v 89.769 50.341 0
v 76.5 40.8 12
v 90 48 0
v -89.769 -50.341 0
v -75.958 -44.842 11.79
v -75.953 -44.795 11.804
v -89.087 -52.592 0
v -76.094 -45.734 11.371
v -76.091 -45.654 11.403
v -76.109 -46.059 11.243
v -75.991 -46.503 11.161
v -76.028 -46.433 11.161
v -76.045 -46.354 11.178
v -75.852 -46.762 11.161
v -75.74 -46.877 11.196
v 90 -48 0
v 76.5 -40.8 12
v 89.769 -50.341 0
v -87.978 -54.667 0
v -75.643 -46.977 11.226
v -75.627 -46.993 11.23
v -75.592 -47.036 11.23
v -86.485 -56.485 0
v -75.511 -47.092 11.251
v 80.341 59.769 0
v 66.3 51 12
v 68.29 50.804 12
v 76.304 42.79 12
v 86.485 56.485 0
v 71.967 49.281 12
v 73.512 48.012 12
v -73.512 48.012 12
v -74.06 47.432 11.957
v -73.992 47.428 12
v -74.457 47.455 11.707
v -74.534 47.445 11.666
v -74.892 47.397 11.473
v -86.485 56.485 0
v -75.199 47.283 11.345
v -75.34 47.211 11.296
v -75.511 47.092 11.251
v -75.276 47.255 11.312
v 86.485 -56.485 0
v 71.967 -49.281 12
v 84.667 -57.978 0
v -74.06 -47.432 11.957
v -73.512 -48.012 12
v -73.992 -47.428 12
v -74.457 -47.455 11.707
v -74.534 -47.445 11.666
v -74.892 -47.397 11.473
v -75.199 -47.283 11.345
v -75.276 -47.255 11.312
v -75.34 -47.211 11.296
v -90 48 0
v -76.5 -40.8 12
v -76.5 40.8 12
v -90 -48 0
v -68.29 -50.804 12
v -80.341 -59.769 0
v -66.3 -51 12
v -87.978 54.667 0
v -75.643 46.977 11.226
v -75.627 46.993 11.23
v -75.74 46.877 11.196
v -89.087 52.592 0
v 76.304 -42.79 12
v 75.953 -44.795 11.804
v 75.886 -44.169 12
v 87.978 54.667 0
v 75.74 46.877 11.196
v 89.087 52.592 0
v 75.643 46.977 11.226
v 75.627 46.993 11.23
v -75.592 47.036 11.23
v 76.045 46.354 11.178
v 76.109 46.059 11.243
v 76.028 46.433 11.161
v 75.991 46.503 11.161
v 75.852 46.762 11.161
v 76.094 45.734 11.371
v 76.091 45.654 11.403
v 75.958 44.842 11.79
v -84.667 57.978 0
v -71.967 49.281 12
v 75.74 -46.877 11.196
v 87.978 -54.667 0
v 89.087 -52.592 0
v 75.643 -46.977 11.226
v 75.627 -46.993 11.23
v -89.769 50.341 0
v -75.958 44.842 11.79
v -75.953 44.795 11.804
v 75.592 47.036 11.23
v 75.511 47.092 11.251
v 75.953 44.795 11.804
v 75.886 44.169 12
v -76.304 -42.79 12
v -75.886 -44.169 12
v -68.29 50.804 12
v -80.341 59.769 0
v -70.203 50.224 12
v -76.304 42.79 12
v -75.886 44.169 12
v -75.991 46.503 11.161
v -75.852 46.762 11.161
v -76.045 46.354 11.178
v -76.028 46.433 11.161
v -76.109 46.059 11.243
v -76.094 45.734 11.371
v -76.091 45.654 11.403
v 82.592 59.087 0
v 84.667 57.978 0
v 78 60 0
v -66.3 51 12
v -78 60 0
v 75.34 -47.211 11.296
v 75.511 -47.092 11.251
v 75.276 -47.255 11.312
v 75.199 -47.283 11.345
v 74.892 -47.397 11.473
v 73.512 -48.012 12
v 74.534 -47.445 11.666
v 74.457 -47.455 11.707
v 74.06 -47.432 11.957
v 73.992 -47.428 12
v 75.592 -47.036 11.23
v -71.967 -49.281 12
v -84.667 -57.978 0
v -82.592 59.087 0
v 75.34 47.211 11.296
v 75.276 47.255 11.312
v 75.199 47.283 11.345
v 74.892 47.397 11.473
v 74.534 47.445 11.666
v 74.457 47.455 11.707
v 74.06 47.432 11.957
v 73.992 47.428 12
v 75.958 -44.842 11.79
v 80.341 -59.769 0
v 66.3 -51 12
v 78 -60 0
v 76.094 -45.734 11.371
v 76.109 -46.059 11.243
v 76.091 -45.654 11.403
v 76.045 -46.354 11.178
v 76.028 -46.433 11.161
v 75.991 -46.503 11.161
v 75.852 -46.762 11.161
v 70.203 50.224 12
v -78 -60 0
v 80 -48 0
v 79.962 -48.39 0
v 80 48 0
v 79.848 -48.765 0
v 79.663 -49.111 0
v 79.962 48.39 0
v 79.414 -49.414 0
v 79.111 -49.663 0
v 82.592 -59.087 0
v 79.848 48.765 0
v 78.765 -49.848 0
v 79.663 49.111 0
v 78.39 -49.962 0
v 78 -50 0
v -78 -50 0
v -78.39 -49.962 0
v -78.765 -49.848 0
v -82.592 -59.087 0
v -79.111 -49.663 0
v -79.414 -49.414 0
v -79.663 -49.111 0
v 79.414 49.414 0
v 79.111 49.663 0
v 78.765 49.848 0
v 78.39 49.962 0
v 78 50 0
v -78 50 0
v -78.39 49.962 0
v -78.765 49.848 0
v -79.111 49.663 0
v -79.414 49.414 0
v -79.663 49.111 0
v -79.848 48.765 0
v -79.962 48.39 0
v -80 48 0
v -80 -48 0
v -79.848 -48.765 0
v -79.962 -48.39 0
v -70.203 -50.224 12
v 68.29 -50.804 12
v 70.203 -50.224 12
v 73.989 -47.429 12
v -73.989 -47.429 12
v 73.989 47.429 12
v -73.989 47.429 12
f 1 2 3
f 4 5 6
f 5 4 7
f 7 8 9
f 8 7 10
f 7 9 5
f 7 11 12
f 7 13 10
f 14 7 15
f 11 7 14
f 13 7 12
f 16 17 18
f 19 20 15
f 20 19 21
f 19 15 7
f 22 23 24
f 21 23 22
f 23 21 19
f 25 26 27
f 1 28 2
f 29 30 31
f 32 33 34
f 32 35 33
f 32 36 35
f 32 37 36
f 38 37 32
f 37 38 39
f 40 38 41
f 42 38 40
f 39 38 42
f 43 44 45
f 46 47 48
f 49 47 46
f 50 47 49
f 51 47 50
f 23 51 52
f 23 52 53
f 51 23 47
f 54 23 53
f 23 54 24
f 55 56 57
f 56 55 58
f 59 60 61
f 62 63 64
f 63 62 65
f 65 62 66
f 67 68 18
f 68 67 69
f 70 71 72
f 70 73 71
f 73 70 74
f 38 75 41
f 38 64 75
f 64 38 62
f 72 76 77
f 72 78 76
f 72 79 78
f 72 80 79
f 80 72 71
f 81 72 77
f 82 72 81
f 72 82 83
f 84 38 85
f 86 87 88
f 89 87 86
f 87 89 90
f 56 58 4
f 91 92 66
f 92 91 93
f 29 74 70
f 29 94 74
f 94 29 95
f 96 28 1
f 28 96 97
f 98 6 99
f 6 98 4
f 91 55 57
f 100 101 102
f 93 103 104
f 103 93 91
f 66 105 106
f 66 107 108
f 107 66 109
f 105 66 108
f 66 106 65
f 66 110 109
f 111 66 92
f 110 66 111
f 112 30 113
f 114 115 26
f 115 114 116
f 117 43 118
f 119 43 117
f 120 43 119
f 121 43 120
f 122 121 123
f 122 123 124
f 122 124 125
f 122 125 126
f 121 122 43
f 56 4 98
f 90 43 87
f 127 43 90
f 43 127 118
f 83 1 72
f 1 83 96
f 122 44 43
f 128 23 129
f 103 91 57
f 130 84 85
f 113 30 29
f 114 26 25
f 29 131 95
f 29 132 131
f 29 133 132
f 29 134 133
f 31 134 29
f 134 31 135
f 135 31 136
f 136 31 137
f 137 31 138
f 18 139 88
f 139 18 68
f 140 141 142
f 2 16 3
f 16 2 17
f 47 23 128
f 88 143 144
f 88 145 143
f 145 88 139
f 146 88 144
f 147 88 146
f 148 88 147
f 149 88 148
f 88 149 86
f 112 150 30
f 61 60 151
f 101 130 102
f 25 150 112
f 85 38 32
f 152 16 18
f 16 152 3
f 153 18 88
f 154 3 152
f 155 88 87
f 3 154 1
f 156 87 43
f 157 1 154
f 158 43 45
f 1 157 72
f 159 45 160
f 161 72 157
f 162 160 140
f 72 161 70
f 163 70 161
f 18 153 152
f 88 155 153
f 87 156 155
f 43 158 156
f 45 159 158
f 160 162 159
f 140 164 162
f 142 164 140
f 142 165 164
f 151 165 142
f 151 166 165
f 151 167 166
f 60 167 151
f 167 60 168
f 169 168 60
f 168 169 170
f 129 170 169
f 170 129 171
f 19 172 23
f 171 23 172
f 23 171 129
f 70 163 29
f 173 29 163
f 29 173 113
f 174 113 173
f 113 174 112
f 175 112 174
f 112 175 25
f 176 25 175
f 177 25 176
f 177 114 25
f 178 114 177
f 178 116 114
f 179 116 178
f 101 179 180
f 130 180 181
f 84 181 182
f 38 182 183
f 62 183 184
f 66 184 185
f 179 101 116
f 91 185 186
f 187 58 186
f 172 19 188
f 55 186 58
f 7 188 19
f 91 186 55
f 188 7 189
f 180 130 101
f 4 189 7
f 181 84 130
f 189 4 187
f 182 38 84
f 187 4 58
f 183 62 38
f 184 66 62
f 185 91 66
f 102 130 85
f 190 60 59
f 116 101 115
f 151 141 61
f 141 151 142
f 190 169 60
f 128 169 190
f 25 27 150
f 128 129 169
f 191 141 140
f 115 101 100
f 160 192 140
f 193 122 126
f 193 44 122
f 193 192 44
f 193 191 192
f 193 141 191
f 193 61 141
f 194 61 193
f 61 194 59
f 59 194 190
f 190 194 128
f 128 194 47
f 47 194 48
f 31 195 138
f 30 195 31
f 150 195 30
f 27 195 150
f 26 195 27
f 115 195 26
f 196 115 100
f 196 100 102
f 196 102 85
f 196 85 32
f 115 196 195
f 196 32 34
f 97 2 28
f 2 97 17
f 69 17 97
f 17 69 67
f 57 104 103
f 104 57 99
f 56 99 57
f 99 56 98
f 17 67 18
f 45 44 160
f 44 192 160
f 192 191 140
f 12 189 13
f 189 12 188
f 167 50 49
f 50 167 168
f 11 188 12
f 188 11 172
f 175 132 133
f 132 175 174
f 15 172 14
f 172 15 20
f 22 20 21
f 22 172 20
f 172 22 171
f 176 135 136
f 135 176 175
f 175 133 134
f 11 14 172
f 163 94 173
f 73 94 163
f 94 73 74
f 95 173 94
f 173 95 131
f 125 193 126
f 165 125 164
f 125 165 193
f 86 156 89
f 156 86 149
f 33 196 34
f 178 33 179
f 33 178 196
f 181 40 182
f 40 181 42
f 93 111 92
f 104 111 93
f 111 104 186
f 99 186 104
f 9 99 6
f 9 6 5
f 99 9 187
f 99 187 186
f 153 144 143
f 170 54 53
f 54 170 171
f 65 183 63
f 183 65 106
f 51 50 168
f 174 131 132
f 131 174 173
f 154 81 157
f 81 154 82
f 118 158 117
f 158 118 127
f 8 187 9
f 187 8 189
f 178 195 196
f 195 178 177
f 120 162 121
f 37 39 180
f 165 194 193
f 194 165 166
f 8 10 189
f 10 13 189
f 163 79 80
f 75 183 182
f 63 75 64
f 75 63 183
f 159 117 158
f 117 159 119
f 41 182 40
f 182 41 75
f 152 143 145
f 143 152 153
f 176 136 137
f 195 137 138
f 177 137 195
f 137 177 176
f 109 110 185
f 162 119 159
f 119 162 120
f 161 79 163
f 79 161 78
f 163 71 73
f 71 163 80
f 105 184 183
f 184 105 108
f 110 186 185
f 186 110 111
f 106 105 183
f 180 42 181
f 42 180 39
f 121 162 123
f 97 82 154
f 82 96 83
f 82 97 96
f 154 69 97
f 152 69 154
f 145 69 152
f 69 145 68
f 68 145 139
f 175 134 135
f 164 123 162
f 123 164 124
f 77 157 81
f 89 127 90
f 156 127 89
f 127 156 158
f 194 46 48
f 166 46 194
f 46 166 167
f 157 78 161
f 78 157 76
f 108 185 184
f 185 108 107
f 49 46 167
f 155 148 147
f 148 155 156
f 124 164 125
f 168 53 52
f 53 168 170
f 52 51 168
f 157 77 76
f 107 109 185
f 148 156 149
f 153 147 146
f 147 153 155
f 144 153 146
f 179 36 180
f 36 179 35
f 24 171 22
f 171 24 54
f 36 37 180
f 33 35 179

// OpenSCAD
$fn = 32;
// ----------------------------------------------------------------------
// Display bezel: 180 x 120 mm frame, opening 160x100 mm
// ----------------------------------------------------------------------

// --- parameters (mm) ---
length = 180;             // frame outside length, X
width = 120;              // frame outside width, Y
frame_w = 10;             // frame width
thickness = 12;           // frame thickness
corner_r = 12;            // outside corner radius
chamfer = 0.85;           // outer wall taper
funnel = 0.94;            // inner opening taper
opening_l = 160;          // opening length
opening_w = 100;          // opening width
inner_r = 2;              // opening corner radius

/* rounded-rectangle outlines, generated with loops */
module rounded_ring(l_nom, w_nom, r) {
  hull() {
    for (sx = [-1, 1]) for (sy = [-1, 1])
      translate([sx * (l_nom / 2 - r), sy * (w_nom / 2 - r)]) circle(r = r);
  }
}

difference() {
  /* frame body, drafted so the outer edge is a variable-depth chamfer */
  linear_extrude(height = thickness, scale = chamfer)
    rounded_ring(length, width, corner_r);
  /* viewing opening, drafted the other way for a funnel edge */
  linear_extrude(height = thickness + 2, scale = funnel)
    translate([0, 0, -1]) rounded_ring(opening_l, opening_w, inner_r);
}
